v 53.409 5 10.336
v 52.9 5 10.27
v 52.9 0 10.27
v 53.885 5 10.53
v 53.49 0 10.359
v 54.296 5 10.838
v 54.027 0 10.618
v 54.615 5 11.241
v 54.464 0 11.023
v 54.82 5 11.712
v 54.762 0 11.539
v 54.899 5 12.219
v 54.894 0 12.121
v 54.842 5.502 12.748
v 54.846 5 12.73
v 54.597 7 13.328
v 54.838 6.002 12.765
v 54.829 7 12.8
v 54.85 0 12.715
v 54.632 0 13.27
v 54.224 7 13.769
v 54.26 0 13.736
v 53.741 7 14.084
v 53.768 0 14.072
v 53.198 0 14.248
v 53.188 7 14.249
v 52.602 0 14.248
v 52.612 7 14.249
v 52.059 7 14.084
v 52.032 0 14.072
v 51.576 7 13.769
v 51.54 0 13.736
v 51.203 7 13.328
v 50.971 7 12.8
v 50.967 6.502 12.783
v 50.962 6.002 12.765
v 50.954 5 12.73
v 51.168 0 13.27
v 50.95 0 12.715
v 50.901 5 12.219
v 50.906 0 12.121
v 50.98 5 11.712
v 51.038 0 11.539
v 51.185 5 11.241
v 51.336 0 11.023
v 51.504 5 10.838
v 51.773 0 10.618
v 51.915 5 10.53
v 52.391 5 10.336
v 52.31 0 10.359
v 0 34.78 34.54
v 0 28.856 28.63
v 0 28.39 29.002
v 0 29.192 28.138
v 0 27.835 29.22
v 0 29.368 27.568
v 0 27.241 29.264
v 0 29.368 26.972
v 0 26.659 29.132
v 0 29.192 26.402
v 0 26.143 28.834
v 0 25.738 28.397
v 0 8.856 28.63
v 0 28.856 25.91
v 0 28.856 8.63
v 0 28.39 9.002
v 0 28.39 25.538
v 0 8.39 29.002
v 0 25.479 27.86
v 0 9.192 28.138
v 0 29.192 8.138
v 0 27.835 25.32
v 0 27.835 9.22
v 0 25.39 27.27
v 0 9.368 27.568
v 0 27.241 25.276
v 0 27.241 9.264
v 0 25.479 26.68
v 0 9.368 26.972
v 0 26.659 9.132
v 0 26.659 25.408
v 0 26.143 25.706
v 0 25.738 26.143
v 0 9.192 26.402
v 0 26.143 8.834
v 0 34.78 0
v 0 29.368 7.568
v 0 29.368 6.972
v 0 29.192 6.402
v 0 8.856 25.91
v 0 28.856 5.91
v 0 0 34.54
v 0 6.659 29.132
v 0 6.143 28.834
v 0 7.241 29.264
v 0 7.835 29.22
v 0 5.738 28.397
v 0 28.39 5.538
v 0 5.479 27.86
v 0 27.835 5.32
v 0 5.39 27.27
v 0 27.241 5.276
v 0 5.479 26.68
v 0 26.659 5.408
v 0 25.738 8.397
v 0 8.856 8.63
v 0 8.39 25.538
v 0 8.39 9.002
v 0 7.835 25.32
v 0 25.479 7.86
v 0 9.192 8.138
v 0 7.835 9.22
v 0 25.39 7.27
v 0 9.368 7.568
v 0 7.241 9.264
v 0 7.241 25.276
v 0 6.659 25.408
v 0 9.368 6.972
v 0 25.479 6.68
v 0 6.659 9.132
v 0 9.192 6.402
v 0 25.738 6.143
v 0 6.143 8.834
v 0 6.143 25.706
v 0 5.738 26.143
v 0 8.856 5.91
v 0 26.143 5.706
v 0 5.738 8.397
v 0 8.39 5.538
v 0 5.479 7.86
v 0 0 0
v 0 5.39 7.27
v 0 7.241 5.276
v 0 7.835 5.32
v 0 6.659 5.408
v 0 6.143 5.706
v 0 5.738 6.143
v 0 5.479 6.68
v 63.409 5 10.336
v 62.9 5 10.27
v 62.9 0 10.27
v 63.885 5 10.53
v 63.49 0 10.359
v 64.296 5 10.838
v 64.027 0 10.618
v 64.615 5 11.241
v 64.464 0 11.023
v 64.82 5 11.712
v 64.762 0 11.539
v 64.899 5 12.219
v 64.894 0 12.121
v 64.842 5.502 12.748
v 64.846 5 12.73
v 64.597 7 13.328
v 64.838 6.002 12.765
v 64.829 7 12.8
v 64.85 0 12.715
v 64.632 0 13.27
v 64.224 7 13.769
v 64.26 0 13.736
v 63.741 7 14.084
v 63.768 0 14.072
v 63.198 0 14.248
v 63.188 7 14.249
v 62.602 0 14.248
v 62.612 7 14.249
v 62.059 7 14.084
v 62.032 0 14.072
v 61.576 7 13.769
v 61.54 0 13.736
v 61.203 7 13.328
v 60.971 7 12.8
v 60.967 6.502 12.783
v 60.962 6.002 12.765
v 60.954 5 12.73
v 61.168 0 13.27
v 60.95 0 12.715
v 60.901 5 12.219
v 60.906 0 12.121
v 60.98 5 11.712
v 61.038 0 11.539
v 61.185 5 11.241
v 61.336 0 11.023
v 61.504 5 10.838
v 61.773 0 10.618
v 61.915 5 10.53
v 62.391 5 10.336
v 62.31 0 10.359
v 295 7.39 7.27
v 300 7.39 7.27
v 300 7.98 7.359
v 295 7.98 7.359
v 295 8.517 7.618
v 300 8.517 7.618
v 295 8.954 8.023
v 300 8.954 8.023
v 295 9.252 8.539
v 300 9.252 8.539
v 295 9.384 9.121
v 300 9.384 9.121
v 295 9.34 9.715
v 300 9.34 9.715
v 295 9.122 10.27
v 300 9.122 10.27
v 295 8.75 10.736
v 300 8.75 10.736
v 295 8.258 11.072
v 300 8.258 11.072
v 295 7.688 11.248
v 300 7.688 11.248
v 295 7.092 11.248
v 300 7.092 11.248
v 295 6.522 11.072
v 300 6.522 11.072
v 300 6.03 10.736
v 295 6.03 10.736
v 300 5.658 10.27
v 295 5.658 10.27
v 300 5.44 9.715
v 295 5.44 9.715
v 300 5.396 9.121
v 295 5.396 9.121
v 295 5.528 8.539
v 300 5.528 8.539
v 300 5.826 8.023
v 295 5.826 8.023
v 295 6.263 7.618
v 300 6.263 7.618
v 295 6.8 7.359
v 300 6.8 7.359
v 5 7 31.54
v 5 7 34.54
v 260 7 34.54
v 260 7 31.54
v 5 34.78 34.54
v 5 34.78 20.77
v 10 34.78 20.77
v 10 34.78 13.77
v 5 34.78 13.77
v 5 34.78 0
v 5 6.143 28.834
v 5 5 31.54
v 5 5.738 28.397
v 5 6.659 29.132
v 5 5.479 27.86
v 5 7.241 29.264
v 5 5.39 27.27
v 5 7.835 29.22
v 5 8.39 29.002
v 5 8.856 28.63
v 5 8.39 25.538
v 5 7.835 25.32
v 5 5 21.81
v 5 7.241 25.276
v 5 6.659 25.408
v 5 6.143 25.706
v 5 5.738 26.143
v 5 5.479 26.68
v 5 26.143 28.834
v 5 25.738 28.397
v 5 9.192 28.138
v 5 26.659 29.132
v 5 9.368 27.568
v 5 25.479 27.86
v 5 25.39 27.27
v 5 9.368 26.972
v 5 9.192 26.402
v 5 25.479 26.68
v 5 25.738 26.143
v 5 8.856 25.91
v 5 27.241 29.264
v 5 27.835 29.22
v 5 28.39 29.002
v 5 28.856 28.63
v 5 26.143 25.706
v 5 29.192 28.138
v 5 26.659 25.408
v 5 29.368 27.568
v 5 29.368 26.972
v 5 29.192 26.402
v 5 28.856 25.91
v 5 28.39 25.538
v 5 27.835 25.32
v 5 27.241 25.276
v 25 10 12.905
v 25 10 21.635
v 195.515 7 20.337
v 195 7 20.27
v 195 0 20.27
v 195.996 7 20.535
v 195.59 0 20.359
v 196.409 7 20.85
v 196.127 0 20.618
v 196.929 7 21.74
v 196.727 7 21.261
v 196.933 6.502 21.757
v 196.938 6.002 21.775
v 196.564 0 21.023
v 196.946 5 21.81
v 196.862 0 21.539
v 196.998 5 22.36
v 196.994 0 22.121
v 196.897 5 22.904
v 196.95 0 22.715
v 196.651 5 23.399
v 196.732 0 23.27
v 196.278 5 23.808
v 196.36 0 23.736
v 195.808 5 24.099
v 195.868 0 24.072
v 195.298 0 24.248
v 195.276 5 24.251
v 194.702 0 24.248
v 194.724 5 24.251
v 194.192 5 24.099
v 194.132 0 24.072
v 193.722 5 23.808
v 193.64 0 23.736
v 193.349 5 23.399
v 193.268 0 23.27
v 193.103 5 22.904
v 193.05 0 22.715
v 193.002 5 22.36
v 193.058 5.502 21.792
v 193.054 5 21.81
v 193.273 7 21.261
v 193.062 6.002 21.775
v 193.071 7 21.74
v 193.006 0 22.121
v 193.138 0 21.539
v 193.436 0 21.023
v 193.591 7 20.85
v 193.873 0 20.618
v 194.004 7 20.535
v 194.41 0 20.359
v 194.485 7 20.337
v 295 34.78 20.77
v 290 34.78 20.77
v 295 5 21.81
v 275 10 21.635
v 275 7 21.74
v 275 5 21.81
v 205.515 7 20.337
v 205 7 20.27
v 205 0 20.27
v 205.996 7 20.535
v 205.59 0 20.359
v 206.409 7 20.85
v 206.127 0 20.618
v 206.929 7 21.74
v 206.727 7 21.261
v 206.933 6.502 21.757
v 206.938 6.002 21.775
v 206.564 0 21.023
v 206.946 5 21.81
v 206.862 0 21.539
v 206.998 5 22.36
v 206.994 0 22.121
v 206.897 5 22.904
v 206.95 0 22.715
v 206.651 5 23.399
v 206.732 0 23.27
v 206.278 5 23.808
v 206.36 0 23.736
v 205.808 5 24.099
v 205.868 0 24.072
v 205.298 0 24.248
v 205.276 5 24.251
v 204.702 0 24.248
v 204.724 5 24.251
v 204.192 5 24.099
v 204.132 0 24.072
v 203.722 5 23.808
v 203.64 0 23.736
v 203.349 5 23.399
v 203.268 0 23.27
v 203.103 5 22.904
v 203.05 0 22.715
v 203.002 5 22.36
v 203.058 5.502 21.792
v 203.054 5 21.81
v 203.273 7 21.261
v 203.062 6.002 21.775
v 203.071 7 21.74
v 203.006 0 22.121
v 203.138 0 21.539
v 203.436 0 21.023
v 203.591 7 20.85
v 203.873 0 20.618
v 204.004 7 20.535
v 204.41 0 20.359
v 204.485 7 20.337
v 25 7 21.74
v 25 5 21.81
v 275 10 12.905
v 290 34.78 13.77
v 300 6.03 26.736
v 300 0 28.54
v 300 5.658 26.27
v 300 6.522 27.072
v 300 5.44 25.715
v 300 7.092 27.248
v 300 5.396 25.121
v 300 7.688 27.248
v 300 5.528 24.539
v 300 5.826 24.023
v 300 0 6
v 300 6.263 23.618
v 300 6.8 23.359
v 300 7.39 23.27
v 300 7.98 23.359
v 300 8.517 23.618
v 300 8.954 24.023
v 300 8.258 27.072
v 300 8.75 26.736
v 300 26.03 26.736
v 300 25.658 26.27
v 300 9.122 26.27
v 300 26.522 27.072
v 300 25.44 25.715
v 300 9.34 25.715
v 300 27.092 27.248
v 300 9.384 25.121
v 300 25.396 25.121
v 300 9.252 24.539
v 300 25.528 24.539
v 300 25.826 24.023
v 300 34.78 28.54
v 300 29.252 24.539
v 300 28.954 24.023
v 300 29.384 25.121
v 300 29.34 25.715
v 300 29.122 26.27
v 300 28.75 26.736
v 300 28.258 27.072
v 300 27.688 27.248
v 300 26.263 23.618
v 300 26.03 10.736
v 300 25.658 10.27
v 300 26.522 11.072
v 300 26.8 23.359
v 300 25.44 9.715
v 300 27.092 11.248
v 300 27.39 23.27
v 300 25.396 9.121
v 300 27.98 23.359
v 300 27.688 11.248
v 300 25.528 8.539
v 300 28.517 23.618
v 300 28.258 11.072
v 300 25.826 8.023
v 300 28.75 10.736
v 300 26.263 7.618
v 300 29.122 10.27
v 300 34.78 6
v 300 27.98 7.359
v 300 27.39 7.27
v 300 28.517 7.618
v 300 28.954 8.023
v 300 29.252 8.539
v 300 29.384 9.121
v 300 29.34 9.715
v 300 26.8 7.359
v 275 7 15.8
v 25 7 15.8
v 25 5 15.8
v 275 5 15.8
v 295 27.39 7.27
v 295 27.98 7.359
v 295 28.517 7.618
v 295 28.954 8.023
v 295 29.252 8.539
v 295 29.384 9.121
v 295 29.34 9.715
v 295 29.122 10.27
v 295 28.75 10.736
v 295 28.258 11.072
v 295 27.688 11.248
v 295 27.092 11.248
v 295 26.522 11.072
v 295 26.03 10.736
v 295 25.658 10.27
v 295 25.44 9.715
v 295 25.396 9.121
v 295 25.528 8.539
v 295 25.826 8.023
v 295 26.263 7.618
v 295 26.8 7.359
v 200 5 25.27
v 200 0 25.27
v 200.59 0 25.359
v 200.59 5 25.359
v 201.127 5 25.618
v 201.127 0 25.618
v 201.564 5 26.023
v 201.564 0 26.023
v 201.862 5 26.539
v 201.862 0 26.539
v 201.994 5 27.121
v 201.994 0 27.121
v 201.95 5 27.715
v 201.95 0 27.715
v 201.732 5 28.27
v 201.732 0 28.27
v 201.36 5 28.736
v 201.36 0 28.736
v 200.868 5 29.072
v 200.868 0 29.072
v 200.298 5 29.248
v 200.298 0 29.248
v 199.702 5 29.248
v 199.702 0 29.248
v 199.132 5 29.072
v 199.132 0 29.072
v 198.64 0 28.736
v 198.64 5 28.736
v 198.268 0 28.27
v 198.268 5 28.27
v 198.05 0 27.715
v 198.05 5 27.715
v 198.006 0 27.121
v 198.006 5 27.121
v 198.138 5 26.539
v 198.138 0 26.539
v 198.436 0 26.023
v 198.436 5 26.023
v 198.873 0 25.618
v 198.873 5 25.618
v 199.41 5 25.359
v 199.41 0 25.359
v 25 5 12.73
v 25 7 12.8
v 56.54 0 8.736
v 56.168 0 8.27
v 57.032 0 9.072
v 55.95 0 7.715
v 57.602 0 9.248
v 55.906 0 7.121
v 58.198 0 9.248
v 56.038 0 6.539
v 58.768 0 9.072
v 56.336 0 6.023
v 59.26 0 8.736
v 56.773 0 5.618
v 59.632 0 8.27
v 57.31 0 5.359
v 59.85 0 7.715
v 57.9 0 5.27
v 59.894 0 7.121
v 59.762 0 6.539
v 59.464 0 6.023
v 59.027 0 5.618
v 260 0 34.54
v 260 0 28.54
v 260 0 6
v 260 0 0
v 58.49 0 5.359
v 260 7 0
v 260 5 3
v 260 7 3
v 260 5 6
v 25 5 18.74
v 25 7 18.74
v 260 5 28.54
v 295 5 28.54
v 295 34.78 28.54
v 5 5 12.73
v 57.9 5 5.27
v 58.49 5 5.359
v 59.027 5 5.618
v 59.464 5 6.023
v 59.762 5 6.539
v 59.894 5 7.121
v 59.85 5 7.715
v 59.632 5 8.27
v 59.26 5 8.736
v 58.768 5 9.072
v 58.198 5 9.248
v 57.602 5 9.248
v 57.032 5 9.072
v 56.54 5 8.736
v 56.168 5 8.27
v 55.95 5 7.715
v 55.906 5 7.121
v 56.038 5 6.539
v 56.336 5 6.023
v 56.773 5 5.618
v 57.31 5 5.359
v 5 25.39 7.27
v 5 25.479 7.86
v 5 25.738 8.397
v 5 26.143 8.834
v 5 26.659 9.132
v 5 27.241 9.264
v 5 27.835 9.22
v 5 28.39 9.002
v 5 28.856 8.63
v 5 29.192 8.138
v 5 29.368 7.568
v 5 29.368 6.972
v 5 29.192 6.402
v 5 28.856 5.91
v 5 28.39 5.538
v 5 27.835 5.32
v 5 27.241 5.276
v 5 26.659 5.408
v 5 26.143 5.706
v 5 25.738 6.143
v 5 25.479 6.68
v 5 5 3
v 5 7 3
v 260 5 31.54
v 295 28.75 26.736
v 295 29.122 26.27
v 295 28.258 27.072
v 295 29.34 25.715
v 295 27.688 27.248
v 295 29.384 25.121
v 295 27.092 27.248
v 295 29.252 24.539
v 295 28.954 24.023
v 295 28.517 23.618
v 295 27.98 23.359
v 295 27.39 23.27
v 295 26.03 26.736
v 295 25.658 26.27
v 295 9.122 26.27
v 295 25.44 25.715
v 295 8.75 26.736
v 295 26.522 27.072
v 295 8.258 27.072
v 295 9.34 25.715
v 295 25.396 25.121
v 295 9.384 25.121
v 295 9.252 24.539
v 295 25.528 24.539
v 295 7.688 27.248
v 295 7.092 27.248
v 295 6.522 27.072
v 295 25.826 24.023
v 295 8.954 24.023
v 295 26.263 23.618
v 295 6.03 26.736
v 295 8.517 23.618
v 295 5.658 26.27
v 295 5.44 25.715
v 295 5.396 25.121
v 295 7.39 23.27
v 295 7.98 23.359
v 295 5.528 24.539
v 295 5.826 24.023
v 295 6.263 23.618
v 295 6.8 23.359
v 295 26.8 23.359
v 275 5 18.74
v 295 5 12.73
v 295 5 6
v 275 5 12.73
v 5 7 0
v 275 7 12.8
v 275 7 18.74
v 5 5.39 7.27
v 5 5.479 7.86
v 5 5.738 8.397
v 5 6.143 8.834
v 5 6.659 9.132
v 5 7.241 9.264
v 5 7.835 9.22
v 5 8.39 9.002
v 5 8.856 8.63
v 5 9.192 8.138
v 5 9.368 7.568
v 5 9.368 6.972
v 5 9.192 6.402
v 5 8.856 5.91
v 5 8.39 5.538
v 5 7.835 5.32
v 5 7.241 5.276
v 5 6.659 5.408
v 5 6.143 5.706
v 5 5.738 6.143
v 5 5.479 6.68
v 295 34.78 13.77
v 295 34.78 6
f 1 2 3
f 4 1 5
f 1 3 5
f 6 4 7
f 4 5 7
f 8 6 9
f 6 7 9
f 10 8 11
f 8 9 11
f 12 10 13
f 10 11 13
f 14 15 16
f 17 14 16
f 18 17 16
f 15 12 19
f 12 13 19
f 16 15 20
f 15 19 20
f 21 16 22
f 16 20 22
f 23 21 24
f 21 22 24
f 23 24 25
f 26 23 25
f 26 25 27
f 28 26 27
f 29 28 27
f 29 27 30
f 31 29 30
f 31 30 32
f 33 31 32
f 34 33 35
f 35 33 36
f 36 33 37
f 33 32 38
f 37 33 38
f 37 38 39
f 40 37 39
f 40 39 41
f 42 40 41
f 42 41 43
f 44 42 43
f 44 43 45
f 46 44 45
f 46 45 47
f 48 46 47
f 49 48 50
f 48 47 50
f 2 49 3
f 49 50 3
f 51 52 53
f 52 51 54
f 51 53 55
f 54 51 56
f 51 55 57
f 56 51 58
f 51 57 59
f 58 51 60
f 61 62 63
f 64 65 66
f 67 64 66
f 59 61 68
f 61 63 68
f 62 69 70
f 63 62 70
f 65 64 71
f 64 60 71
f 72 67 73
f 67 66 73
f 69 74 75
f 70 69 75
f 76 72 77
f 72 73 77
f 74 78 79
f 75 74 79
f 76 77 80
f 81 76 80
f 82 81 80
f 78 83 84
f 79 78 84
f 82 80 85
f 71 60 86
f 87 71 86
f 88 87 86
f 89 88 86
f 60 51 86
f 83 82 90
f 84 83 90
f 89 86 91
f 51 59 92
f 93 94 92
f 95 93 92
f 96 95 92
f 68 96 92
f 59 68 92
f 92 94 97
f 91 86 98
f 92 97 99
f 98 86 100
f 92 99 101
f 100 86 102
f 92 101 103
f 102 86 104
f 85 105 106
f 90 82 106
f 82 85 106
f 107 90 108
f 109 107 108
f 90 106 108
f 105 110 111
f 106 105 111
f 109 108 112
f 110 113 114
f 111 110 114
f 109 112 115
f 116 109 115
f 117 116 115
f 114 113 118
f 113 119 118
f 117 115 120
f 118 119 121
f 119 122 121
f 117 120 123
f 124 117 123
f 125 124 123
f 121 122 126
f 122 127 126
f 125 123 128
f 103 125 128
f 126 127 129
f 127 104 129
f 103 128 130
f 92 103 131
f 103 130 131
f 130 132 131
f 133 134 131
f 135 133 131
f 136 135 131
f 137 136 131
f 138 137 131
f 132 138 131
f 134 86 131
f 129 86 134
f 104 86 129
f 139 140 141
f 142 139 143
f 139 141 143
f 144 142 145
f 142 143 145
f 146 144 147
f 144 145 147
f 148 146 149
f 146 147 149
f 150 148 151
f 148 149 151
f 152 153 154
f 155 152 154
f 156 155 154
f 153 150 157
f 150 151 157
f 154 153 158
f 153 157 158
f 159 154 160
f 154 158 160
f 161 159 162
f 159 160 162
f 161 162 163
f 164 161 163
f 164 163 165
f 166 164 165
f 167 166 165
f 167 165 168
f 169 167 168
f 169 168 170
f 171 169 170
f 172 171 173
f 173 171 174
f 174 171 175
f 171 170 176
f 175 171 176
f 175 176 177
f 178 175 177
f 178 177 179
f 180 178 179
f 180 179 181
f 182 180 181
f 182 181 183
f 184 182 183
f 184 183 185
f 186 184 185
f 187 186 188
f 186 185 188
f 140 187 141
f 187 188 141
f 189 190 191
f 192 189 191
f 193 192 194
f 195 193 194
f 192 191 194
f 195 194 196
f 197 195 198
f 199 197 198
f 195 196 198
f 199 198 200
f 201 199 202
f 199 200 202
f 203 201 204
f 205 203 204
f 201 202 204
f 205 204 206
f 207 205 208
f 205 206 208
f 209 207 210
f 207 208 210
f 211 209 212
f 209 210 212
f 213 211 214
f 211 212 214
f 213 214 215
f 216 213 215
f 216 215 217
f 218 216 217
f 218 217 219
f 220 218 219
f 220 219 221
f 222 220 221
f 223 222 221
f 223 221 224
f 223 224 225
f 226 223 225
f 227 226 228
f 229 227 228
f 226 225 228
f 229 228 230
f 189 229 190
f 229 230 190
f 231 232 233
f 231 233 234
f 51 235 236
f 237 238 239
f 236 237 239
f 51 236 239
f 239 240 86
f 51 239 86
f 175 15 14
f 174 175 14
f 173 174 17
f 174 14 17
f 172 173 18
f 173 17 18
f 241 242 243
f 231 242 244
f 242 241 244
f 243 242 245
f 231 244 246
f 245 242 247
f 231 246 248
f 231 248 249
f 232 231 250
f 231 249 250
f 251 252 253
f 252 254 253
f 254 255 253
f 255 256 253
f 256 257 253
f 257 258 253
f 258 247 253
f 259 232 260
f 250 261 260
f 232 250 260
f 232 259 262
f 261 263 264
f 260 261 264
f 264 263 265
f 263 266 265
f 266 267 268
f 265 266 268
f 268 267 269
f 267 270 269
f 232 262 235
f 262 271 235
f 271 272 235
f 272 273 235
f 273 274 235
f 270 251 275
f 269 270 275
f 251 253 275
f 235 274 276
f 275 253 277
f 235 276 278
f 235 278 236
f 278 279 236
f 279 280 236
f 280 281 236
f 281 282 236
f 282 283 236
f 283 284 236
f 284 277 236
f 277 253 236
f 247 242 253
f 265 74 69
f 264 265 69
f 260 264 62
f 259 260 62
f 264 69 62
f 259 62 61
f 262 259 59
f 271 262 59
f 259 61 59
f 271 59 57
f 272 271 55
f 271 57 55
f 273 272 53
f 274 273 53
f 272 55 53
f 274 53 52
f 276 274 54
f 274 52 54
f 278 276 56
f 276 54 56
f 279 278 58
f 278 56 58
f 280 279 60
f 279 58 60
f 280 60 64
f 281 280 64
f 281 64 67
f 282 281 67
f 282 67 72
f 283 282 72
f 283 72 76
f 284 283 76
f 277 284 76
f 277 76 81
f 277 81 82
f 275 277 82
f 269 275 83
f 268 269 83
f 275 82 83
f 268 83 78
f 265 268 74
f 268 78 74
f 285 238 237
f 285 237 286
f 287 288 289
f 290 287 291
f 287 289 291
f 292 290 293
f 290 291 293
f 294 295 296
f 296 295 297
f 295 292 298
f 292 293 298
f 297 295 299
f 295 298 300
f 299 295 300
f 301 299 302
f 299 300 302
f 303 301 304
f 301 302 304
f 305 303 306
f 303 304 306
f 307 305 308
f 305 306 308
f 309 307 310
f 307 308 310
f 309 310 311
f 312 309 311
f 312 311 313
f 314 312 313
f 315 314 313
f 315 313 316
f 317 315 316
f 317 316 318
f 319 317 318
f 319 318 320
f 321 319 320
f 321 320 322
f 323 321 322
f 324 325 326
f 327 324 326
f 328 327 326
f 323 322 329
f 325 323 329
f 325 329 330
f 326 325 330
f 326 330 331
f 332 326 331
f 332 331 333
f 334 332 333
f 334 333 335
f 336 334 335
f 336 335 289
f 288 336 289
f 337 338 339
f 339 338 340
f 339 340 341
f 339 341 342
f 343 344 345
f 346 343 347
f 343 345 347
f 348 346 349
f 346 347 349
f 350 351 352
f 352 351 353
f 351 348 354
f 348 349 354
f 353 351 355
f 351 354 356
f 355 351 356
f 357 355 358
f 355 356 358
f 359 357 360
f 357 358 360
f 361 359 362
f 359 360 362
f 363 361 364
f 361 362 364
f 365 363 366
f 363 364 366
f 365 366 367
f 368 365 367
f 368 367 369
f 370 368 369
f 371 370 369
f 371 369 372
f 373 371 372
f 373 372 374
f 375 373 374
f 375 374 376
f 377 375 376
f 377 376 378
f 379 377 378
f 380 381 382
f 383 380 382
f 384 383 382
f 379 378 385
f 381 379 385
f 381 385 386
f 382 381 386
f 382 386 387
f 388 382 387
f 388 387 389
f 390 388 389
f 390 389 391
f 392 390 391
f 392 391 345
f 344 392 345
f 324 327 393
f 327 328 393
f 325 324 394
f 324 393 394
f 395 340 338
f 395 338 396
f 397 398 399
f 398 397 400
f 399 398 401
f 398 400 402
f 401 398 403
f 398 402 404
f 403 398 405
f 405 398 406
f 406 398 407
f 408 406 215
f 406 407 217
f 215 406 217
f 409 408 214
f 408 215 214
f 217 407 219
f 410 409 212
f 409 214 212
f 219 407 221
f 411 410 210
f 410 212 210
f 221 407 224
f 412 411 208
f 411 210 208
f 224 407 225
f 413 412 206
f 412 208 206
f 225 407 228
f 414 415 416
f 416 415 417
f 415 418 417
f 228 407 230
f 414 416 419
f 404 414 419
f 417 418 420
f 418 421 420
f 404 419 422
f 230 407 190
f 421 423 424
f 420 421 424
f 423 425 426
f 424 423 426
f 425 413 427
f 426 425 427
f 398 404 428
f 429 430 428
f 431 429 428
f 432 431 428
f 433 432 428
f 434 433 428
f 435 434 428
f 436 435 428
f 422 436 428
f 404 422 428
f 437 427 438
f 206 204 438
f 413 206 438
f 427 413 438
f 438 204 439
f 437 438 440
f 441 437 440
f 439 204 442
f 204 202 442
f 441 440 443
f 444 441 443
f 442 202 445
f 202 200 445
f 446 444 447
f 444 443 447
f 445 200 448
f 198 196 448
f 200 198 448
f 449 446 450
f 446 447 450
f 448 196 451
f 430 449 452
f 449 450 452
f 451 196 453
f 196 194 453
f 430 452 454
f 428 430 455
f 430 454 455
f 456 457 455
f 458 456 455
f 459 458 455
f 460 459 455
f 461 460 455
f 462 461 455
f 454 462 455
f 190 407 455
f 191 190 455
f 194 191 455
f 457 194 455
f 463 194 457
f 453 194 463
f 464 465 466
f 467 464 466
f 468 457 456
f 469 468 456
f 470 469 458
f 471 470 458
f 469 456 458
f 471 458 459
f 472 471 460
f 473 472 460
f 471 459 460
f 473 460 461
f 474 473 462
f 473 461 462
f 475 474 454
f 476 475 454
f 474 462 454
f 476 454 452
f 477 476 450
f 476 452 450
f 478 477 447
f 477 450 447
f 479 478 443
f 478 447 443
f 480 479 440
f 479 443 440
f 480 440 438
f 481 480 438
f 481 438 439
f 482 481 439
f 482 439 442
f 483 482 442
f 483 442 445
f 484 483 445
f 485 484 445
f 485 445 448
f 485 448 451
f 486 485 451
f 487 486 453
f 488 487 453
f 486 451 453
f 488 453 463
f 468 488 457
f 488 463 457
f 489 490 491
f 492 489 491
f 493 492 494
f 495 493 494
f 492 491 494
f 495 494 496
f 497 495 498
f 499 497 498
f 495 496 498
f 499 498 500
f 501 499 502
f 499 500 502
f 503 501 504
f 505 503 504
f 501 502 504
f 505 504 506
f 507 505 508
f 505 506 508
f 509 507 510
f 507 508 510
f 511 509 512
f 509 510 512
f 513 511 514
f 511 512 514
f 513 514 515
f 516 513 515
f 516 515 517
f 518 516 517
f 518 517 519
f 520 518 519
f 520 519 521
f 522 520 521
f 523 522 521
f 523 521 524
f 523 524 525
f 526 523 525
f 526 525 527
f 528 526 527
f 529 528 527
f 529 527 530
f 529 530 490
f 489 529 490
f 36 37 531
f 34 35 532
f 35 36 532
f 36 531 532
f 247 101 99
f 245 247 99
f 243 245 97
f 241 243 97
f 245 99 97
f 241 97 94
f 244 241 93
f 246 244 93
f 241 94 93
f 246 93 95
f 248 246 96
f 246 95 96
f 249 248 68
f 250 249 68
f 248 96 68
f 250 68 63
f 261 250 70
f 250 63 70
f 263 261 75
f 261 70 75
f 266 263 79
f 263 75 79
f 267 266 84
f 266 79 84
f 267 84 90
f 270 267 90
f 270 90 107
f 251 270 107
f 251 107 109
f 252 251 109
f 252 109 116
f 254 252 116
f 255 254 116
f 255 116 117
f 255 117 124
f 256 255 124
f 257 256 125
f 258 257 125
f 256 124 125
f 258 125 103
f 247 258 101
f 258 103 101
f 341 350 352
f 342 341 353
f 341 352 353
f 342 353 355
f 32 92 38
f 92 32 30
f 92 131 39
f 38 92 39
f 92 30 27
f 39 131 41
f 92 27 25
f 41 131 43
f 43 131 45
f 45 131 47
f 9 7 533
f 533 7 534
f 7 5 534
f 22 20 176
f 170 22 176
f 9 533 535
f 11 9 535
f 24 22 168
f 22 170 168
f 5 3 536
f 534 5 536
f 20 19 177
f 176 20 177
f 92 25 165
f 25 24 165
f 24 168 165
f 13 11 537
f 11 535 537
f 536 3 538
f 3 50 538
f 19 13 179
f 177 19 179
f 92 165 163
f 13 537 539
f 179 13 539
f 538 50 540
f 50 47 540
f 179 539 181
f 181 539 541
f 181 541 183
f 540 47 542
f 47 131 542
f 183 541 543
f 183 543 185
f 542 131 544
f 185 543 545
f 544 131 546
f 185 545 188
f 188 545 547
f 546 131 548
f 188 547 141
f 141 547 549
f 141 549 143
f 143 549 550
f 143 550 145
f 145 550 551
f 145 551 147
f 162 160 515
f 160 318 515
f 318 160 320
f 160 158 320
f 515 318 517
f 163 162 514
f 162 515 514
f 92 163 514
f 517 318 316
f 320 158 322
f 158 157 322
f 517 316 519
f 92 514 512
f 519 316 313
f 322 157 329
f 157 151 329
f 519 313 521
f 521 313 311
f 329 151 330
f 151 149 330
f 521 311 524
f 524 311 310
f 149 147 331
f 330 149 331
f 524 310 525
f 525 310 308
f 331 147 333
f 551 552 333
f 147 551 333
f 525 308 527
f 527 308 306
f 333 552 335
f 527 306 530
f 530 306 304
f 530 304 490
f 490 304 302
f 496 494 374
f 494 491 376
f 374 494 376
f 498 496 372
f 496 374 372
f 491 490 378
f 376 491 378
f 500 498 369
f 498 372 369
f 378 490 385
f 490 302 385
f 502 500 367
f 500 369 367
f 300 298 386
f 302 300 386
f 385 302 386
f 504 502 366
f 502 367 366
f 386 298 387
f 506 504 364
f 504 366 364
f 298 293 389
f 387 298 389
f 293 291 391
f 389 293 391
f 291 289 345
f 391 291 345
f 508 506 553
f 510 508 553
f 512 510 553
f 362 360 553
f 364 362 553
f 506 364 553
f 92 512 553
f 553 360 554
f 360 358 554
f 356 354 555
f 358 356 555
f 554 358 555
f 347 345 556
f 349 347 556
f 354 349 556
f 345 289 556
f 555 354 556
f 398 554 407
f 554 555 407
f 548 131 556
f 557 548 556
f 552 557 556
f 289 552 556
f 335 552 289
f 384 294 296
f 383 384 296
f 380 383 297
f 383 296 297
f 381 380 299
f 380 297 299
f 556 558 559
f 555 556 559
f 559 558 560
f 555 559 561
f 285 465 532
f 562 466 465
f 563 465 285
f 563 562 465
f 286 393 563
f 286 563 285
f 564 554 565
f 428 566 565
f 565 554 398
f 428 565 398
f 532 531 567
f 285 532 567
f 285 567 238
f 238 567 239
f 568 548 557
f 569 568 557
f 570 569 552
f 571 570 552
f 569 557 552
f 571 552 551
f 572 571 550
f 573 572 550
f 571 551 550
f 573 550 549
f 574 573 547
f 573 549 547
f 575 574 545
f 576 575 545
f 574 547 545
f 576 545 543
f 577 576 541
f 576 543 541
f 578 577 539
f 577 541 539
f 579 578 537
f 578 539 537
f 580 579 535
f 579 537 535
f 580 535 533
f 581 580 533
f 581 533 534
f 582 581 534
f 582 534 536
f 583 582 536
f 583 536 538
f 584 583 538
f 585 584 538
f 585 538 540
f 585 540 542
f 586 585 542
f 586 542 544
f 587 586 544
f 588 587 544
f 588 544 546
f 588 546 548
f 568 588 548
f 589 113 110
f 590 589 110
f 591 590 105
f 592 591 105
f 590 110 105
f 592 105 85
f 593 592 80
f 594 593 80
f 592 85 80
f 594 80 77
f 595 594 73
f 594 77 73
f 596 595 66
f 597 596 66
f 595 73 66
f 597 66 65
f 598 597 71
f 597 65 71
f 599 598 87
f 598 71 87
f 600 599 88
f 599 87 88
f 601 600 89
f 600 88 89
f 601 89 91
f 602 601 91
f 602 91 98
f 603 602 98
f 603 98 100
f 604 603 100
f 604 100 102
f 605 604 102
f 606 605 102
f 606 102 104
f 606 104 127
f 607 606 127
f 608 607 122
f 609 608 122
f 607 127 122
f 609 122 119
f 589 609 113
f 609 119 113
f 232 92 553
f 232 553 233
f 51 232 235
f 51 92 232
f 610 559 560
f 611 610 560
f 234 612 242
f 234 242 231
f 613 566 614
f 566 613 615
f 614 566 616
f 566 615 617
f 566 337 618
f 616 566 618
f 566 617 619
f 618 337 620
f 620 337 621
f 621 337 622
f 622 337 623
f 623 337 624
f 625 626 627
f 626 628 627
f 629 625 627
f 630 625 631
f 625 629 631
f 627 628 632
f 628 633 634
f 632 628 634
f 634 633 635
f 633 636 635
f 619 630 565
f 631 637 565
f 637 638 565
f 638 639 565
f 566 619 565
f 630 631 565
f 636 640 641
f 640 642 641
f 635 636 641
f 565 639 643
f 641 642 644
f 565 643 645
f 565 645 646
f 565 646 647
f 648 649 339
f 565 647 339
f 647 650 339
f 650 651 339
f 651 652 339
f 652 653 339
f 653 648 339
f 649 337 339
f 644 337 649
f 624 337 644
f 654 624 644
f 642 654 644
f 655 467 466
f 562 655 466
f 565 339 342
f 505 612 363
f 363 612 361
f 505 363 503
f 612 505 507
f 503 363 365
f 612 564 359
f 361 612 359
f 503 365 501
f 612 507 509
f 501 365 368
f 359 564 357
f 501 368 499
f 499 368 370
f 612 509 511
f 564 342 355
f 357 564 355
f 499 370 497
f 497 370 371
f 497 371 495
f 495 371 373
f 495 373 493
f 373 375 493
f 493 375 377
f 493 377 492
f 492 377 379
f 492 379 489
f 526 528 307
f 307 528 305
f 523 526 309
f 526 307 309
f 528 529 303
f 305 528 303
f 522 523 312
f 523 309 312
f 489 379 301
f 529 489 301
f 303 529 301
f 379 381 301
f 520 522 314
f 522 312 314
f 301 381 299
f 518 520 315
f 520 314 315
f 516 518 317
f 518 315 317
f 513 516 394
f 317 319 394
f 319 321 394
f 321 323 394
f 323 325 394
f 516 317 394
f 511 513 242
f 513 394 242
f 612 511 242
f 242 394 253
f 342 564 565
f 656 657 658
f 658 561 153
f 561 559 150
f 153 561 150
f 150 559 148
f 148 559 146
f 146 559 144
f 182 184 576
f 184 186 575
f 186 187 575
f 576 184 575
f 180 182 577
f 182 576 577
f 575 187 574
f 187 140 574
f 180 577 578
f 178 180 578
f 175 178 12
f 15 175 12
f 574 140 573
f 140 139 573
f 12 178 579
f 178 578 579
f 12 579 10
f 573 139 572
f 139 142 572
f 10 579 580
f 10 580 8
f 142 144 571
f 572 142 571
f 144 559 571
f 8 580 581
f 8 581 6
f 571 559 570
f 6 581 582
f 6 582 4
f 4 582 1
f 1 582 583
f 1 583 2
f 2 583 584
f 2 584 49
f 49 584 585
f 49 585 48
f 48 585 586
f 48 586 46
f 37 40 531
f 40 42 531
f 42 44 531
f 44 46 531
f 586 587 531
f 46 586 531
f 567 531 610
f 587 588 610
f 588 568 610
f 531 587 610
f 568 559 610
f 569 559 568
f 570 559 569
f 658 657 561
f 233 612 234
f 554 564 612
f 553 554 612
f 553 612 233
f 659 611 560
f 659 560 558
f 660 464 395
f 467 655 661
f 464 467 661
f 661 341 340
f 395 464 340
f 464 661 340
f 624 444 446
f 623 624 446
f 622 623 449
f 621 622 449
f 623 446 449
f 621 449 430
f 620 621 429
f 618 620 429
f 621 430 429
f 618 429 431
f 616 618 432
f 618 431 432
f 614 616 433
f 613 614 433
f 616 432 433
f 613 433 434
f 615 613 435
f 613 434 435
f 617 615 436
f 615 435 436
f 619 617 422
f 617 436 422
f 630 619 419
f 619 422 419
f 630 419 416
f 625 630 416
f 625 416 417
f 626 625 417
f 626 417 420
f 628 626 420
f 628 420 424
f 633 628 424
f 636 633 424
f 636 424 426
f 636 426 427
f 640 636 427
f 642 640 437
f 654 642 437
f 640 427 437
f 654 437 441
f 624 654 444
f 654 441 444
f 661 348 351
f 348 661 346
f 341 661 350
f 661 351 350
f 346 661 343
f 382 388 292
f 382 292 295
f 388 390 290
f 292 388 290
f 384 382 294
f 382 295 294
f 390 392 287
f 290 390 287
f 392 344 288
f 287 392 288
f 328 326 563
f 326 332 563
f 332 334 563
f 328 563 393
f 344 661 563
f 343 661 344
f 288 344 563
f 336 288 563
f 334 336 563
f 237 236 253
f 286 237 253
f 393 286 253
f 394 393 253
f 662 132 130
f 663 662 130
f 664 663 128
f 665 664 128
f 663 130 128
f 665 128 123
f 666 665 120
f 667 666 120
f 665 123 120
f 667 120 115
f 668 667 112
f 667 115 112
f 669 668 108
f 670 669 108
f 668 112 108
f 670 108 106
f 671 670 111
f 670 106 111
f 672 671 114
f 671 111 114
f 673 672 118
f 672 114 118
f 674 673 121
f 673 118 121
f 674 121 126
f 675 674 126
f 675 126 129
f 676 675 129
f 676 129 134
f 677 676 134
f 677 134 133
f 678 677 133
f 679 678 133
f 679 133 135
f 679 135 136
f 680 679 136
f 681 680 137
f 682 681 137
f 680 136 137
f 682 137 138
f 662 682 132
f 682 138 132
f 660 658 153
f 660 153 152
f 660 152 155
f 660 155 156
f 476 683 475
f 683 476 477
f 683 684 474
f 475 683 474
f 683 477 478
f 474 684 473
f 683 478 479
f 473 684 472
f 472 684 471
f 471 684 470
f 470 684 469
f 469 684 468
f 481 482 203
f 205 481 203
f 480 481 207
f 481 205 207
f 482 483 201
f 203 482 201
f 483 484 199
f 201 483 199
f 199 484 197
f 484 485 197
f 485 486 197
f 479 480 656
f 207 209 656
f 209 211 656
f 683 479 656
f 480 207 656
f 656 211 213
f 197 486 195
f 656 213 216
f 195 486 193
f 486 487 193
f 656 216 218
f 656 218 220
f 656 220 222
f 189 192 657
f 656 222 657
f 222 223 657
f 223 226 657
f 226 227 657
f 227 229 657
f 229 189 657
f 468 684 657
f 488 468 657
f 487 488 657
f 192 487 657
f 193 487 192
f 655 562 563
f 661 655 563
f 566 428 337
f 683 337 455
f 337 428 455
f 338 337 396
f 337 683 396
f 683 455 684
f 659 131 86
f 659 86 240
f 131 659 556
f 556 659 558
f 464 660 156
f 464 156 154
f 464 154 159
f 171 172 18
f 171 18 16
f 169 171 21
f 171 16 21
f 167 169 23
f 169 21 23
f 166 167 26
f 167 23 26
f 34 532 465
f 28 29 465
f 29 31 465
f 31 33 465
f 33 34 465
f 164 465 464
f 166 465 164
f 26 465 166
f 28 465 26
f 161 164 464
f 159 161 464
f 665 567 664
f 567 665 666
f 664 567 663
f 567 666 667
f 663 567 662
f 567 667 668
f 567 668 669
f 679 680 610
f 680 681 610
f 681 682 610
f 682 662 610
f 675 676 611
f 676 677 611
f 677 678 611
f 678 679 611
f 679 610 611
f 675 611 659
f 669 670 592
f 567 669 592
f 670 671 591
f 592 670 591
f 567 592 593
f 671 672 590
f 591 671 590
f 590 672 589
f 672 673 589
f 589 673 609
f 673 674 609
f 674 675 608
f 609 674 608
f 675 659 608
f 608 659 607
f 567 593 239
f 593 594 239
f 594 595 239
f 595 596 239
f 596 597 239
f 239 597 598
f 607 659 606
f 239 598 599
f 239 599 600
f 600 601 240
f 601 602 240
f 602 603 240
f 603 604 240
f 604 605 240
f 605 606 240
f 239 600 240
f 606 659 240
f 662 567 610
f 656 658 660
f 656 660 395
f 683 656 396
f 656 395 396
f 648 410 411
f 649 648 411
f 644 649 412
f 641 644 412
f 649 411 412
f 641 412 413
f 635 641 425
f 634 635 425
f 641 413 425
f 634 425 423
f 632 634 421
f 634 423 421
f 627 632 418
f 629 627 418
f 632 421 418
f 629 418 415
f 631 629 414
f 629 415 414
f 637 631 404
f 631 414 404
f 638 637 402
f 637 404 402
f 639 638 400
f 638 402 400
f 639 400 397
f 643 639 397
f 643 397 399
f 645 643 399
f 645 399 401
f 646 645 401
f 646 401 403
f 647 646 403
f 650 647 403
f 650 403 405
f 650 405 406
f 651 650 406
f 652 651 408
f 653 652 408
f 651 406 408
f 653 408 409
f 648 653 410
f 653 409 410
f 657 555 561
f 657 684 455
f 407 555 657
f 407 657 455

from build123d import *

# Parameters (mm, degrees)
EXTRUDE_1_DEPTH          = 34.54
CUT_EXTRUDE_1_REACH      = 305.978
SKETCH_2_W               = 40
SKETCH_2_H               = 6
SKETCH_3_R               = 2
CUT_EXTRUDE_2_DEPTH      = 5
SKETCH_4_R               = 2
CUT_EXTRUDE_3_DEPTH      = 5
RIB_START                = 5
RIB_7_DEPTH              = 20
RIB_START_2              = 12.730059485
RIB_7_2_DEPTH            = 9.07988103
RIB_START_3              = 275
RIB_19_DEPTH             = 20
RIB_START_4              = 147.269934089
RIB_19_2_DEPTH           = 35.576868781
EXTRUDE_2_REACH          = 301.045
SKETCH_8_W               = 3
SKETCH_8_H               = 2
CUT_EXTRUDE_4_DEPTH      = 304.978058419
CUT_EXTRUDE_4_DEPTH_BACK = 304.978058419
SKETCH_9_W               = 35
SKETCH_9_H               = 3
CUT_EXTRUDE_5_REACH      = 305.978
SKETCH_10_R              = 2
CUT_EXTRUDE_6_REACH      = 305.978
SKETCH_11_R              = 2


with BuildPart() as part:
    # 草图1 → 凸台-拉伸1 (new body)
    with BuildSketch(Plane.XY):
        Polygon((0, 0), (300, 0), (300, 34.78), (295, 34.78), (295, 5), (5, 5), (5, 34.78), (0, 34.78), align=None)
    extrude(amount=EXTRUDE_1_DEPTH)

    # 切除-拉伸1: up to this face of the body (flat: up to its plane)
    cut_extrude_1_end = Plane(part.part.faces().sort_by_distance((297.5, 34.78, 17.27))[0])
    # 草图2 → 切除-拉伸1 (cut, up to the picked face)
    with BuildSketch(Plane.XZ, mode=Mode.PRIVATE) as cut_extrude_1_sk1:
        with Locations((280, 31.54)):
            Rectangle(SKETCH_2_W, SKETCH_2_H)
    cut_extrude_1_tool1 = split(extrude(cut_extrude_1_sk1.sketch, amount=-CUT_EXTRUDE_1_REACH, mode=Mode.PRIVATE), bisect_by=cut_extrude_1_end, keep=Keep.BOTH, mode=Mode.PRIVATE)
    # 草图2 → 切除-拉伸1 (cut, up to the picked face)
    with BuildSketch(Plane.XZ, mode=Mode.PRIVATE) as cut_extrude_1_sk2:
        with Locations((280, 3)):
            Rectangle(SKETCH_2_W, SKETCH_2_H)
    cut_extrude_1_tool2 = split(extrude(cut_extrude_1_sk2.sketch, amount=-CUT_EXTRUDE_1_REACH, mode=Mode.PRIVATE), bisect_by=cut_extrude_1_end, keep=Keep.BOTH, mode=Mode.PRIVATE)
    add(cut_extrude_1_tool1.solids().sort_by(Axis((280, 0, 31.54), (0, 1, 0)))[0], mode=Mode.SUBTRACT)
    add(cut_extrude_1_tool2.solids().sort_by(Axis((280, 0, 3), (0, 1, 0)))[0], mode=Mode.SUBTRACT)

    # 草图3 → 切除-拉伸2 (cut)
    with BuildSketch(Plane(origin=(300, 0, 0), x_dir=(0, 0, -1), z_dir=(1, 0, 0))):
        with Locations((-25.27, 7.39)):
            Circle(SKETCH_3_R)
        with Locations((-25.27, 27.39)):
            Circle(SKETCH_3_R)
        with Locations((-9.27, 27.39)):
            Circle(SKETCH_3_R)
        with Locations((-9.27, 7.39)):
            Circle(SKETCH_3_R)
    extrude(amount=-CUT_EXTRUDE_2_DEPTH, mode=Mode.SUBTRACT)

    # 草图4 → 切除-拉伸3 (cut)
    with BuildSketch(Plane.ZY):
        with Locations(Location((7.27, 27.39, 0), (0, 0, 270))):
            Circle(SKETCH_4_R)
        with Locations(Location((27.27, 27.39, 0), (0, 0, 270))):
            Circle(SKETCH_4_R)
        with Locations(Location((27.27, 7.39, 0), (0, 0, 270))):
            Circle(SKETCH_4_R)
        with Locations(Location((7.27, 7.39, 0), (0, 0, 270))):
            Circle(SKETCH_4_R)
    extrude(amount=-CUT_EXTRUDE_3_DEPTH, mode=Mode.SUBTRACT)

    # 筋7: read off the stored shape, not the designer's step
    # 筋7 outline → 筋7 (add)
    with BuildSketch(Plane.YZ.offset(RIB_START)):
        Polygon((34.78, 13.77), (34.78, 20.77), (5, 21.809940515), (5, 12.730059485), align=None)
    extrude(amount=RIB_7_DEPTH)

    # Rib 7 2 outline → Rib 7 2 (cut)
    with BuildSketch(Plane.XY.offset(RIB_START_2)):
        Polygon((25, 34.78), (10, 34.78), (25, 10), align=None)
    extrude(amount=RIB_7_2_DEPTH, mode=Mode.SUBTRACT)

    # 筋19: read off the stored shape, not the designer's step
    # 筋19 outline → 筋19 (add)
    with BuildSketch(Plane.YZ.offset(RIB_START_3)):
        Polygon((34.78, 13.77), (34.78, 20.77), (5, 21.809940515), (5, 12.730059485), align=None)
    extrude(amount=RIB_19_DEPTH)

    # Rib 19 2 outline → Rib 19 2 (cut)
    with BuildSketch(Plane(origin=(0, 0, 0), x_dir=(0.8556156704777578, -0.5172963390397041, -0.018064386206466228), z_dir=(0.5176116540736858, 0.8550944525297293, 0.02986055625713262)).offset(RIB_START_4)):
        Polygon((229.730516914, -21.273162039), (229.888231169, -12.547807193), (216, -12.547807193), (216, -23), (229.699303632, -23), align=None)
    extrude(amount=RIB_19_2_DEPTH, mode=Mode.SUBTRACT)

    # 凸台-拉伸2: up to this face of the body (flat: up to its plane)
    extrude_2_end = Plane(part.part.faces().sort_by_distance((295, 20.622218635, 24.86118076))[0])
    # 草图8 → 凸台-拉伸2 (add, up to the picked face)
    with BuildSketch(Plane(origin=(5, 0, 0), x_dir=(0, 0, -1), z_dir=(1, 0, 0)), mode=Mode.PRIVATE) as extrude_2_sk1:
        with Locations((-33.04, 6)):
            Rectangle(SKETCH_8_W, SKETCH_8_H)
    extrude_2_tool1 = split(extrude(extrude_2_sk1.sketch, amount=EXTRUDE_2_REACH, mode=Mode.PRIVATE), bisect_by=extrude_2_end, keep=Keep.BOTH, mode=Mode.PRIVATE)
    # 草图8 → 凸台-拉伸2 (add, up to the picked face)
    with BuildSketch(Plane(origin=(5, 0, 0), x_dir=(0, 0, -1), z_dir=(1, 0, 0)), mode=Mode.PRIVATE) as extrude_2_sk2:
        Polygon((-21.740098976, 7), (-21.809940515, 5), (-18.740098976, 5), (-18.740098976, 7), align=None)
    extrude_2_tool2 = split(extrude(extrude_2_sk2.sketch, amount=EXTRUDE_2_REACH, mode=Mode.PRIVATE), bisect_by=extrude_2_end, keep=Keep.BOTH, mode=Mode.PRIVATE)
    # 草图8 → 凸台-拉伸2 (add, up to the picked face)
    with BuildSketch(Plane(origin=(5, 0, 0), x_dir=(0, 0, -1), z_dir=(1, 0, 0)), mode=Mode.PRIVATE) as extrude_2_sk3:
        Polygon((-15.799901024, 7), (-15.799901024, 5), (-12.730059485, 5), (-12.799901024, 7), align=None)
    extrude_2_tool3 = split(extrude(extrude_2_sk3.sketch, amount=EXTRUDE_2_REACH, mode=Mode.PRIVATE), bisect_by=extrude_2_end, keep=Keep.BOTH, mode=Mode.PRIVATE)
    # 草图8 → 凸台-拉伸2 (add, up to the picked face)
    with BuildSketch(Plane(origin=(5, 0, 0), x_dir=(0, 0, -1), z_dir=(1, 0, 0)), mode=Mode.PRIVATE) as extrude_2_sk4:
        with Locations((-1.5, 6)):
            Rectangle(SKETCH_8_W, SKETCH_8_H)
    extrude_2_tool4 = split(extrude(extrude_2_sk4.sketch, amount=EXTRUDE_2_REACH, mode=Mode.PRIVATE), bisect_by=extrude_2_end, keep=Keep.BOTH, mode=Mode.PRIVATE)
    add(extrude_2_tool1.solids().sort_by(Axis((5, 6, 33.04), (1, 0, 0)))[0])
    add(extrude_2_tool2.solids().sort_by(Axis((5, 5.996165, 20.257626), (1, 0, 0)))[0])
    add(extrude_2_tool3.solids().sort_by(Axis((5, 5.996165, 14.282374), (1, 0, 0)))[0])
    add(extrude_2_tool4.solids().sort_by(Axis((5, 6, 1.5), (1, 0, 0)))[0])

    # 草图9 → 切除-拉伸4 (cut, two sides: drawn at the far end of the back side and taken through both)
    with BuildSketch(Plane.XZ.offset(-CUT_EXTRUDE_4_DEPTH_BACK)):
        with Locations((277.5, 1.5)):
            Rectangle(SKETCH_9_W, SKETCH_9_H)
        with Locations((277.5, 33.04)):
            Rectangle(SKETCH_9_W, SKETCH_9_H)
    extrude(amount=CUT_EXTRUDE_4_DEPTH + CUT_EXTRUDE_4_DEPTH_BACK, mode=Mode.SUBTRACT)

    # 切除-拉伸5: up to this face of the body (flat: up to its plane)
    cut_extrude_5_end = Plane(part.part.faces().sort_by_distance((132.5, 7, 33.04))[0])
    # 草图10 → 切除-拉伸5 (cut, up to the picked face)
    with BuildSketch(Plane.XZ, mode=Mode.PRIVATE) as cut_extrude_5_sk1:
        with Locations(Location((205, 22.27, 0), (0, 0, 270))):
            Circle(SKETCH_10_R)
    cut_extrude_5_tool1 = split(extrude(cut_extrude_5_sk1.sketch, amount=-CUT_EXTRUDE_5_REACH, mode=Mode.PRIVATE), bisect_by=cut_extrude_5_end, keep=Keep.BOTH, mode=Mode.PRIVATE)
    # 草图10 → 切除-拉伸5 (cut, up to the picked face)
    with BuildSketch(Plane.XZ, mode=Mode.PRIVATE) as cut_extrude_5_sk2:
        with Locations(Location((200, 27.27, 0), (0, 0, 270))):
            Circle(SKETCH_10_R)
    cut_extrude_5_tool2 = split(extrude(cut_extrude_5_sk2.sketch, amount=-CUT_EXTRUDE_5_REACH, mode=Mode.PRIVATE), bisect_by=cut_extrude_5_end, keep=Keep.BOTH, mode=Mode.PRIVATE)
    # 草图10 → 切除-拉伸5 (cut, up to the picked face)
    with BuildSketch(Plane.XZ, mode=Mode.PRIVATE) as cut_extrude_5_sk3:
        with Locations(Location((195, 22.27, 0), (0, 0, 270))):
            Circle(SKETCH_10_R)
    cut_extrude_5_tool3 = split(extrude(cut_extrude_5_sk3.sketch, amount=-CUT_EXTRUDE_5_REACH, mode=Mode.PRIVATE), bisect_by=cut_extrude_5_end, keep=Keep.BOTH, mode=Mode.PRIVATE)
    add(cut_extrude_5_tool1.solids().sort_by(Axis((205, 0, 22.27), (0, 1, 0)))[0], mode=Mode.SUBTRACT)
    add(cut_extrude_5_tool2.solids().sort_by(Axis((200, 0, 27.27), (0, 1, 0)))[0], mode=Mode.SUBTRACT)
    add(cut_extrude_5_tool3.solids().sort_by(Axis((195, 0, 22.27), (0, 1, 0)))[0], mode=Mode.SUBTRACT)

    # 切除-拉伸6: up to this face of the body (flat: up to its plane)
    cut_extrude_6_end = Plane(part.part.faces().sort_by_distance((150, 7, 14.299901024))[0])
    # 草图11 → 切除-拉伸6 (cut, up to the picked face)
    with BuildSketch(Plane.XZ, mode=Mode.PRIVATE) as cut_extrude_6_sk1:
        with Locations(Location((52.9, 12.27, 0), (0, 0, 270))):
            Circle(SKETCH_11_R)
    cut_extrude_6_tool1 = split(extrude(cut_extrude_6_sk1.sketch, amount=-CUT_EXTRUDE_6_REACH, mode=Mode.PRIVATE), bisect_by=cut_extrude_6_end, keep=Keep.BOTH, mode=Mode.PRIVATE)
    # 草图11 → 切除-拉伸6 (cut, up to the picked face)
    with BuildSketch(Plane.XZ, mode=Mode.PRIVATE) as cut_extrude_6_sk2:
        with Locations(Location((62.9, 12.27, 0), (0, 0, 270))):
            Circle(SKETCH_11_R)
    cut_extrude_6_tool2 = split(extrude(cut_extrude_6_sk2.sketch, amount=-CUT_EXTRUDE_6_REACH, mode=Mode.PRIVATE), bisect_by=cut_extrude_6_end, keep=Keep.BOTH, mode=Mode.PRIVATE)
    # 草图11 → 切除-拉伸6 (cut, up to the picked face)
    with BuildSketch(Plane.XZ, mode=Mode.PRIVATE) as cut_extrude_6_sk3:
        with Locations(Location((57.9, 7.27, 0), (0, 0, 270))):
            Circle(SKETCH_11_R)
    cut_extrude_6_tool3 = split(extrude(cut_extrude_6_sk3.sketch, amount=-CUT_EXTRUDE_6_REACH, mode=Mode.PRIVATE), bisect_by=cut_extrude_6_end, keep=Keep.BOTH, mode=Mode.PRIVATE)
    add(cut_extrude_6_tool1.solids().sort_by(Axis((52.9, 0, 12.27), (0, 1, 0)))[0], mode=Mode.SUBTRACT)
    add(cut_extrude_6_tool2.solids().sort_by(Axis((62.9, 0, 12.27), (0, 1, 0)))[0], mode=Mode.SUBTRACT)
    add(cut_extrude_6_tool3.solids().sort_by(Axis((57.9, 0, 7.27), (0, 1, 0)))[0], mode=Mode.SUBTRACT)


solid = part.part
